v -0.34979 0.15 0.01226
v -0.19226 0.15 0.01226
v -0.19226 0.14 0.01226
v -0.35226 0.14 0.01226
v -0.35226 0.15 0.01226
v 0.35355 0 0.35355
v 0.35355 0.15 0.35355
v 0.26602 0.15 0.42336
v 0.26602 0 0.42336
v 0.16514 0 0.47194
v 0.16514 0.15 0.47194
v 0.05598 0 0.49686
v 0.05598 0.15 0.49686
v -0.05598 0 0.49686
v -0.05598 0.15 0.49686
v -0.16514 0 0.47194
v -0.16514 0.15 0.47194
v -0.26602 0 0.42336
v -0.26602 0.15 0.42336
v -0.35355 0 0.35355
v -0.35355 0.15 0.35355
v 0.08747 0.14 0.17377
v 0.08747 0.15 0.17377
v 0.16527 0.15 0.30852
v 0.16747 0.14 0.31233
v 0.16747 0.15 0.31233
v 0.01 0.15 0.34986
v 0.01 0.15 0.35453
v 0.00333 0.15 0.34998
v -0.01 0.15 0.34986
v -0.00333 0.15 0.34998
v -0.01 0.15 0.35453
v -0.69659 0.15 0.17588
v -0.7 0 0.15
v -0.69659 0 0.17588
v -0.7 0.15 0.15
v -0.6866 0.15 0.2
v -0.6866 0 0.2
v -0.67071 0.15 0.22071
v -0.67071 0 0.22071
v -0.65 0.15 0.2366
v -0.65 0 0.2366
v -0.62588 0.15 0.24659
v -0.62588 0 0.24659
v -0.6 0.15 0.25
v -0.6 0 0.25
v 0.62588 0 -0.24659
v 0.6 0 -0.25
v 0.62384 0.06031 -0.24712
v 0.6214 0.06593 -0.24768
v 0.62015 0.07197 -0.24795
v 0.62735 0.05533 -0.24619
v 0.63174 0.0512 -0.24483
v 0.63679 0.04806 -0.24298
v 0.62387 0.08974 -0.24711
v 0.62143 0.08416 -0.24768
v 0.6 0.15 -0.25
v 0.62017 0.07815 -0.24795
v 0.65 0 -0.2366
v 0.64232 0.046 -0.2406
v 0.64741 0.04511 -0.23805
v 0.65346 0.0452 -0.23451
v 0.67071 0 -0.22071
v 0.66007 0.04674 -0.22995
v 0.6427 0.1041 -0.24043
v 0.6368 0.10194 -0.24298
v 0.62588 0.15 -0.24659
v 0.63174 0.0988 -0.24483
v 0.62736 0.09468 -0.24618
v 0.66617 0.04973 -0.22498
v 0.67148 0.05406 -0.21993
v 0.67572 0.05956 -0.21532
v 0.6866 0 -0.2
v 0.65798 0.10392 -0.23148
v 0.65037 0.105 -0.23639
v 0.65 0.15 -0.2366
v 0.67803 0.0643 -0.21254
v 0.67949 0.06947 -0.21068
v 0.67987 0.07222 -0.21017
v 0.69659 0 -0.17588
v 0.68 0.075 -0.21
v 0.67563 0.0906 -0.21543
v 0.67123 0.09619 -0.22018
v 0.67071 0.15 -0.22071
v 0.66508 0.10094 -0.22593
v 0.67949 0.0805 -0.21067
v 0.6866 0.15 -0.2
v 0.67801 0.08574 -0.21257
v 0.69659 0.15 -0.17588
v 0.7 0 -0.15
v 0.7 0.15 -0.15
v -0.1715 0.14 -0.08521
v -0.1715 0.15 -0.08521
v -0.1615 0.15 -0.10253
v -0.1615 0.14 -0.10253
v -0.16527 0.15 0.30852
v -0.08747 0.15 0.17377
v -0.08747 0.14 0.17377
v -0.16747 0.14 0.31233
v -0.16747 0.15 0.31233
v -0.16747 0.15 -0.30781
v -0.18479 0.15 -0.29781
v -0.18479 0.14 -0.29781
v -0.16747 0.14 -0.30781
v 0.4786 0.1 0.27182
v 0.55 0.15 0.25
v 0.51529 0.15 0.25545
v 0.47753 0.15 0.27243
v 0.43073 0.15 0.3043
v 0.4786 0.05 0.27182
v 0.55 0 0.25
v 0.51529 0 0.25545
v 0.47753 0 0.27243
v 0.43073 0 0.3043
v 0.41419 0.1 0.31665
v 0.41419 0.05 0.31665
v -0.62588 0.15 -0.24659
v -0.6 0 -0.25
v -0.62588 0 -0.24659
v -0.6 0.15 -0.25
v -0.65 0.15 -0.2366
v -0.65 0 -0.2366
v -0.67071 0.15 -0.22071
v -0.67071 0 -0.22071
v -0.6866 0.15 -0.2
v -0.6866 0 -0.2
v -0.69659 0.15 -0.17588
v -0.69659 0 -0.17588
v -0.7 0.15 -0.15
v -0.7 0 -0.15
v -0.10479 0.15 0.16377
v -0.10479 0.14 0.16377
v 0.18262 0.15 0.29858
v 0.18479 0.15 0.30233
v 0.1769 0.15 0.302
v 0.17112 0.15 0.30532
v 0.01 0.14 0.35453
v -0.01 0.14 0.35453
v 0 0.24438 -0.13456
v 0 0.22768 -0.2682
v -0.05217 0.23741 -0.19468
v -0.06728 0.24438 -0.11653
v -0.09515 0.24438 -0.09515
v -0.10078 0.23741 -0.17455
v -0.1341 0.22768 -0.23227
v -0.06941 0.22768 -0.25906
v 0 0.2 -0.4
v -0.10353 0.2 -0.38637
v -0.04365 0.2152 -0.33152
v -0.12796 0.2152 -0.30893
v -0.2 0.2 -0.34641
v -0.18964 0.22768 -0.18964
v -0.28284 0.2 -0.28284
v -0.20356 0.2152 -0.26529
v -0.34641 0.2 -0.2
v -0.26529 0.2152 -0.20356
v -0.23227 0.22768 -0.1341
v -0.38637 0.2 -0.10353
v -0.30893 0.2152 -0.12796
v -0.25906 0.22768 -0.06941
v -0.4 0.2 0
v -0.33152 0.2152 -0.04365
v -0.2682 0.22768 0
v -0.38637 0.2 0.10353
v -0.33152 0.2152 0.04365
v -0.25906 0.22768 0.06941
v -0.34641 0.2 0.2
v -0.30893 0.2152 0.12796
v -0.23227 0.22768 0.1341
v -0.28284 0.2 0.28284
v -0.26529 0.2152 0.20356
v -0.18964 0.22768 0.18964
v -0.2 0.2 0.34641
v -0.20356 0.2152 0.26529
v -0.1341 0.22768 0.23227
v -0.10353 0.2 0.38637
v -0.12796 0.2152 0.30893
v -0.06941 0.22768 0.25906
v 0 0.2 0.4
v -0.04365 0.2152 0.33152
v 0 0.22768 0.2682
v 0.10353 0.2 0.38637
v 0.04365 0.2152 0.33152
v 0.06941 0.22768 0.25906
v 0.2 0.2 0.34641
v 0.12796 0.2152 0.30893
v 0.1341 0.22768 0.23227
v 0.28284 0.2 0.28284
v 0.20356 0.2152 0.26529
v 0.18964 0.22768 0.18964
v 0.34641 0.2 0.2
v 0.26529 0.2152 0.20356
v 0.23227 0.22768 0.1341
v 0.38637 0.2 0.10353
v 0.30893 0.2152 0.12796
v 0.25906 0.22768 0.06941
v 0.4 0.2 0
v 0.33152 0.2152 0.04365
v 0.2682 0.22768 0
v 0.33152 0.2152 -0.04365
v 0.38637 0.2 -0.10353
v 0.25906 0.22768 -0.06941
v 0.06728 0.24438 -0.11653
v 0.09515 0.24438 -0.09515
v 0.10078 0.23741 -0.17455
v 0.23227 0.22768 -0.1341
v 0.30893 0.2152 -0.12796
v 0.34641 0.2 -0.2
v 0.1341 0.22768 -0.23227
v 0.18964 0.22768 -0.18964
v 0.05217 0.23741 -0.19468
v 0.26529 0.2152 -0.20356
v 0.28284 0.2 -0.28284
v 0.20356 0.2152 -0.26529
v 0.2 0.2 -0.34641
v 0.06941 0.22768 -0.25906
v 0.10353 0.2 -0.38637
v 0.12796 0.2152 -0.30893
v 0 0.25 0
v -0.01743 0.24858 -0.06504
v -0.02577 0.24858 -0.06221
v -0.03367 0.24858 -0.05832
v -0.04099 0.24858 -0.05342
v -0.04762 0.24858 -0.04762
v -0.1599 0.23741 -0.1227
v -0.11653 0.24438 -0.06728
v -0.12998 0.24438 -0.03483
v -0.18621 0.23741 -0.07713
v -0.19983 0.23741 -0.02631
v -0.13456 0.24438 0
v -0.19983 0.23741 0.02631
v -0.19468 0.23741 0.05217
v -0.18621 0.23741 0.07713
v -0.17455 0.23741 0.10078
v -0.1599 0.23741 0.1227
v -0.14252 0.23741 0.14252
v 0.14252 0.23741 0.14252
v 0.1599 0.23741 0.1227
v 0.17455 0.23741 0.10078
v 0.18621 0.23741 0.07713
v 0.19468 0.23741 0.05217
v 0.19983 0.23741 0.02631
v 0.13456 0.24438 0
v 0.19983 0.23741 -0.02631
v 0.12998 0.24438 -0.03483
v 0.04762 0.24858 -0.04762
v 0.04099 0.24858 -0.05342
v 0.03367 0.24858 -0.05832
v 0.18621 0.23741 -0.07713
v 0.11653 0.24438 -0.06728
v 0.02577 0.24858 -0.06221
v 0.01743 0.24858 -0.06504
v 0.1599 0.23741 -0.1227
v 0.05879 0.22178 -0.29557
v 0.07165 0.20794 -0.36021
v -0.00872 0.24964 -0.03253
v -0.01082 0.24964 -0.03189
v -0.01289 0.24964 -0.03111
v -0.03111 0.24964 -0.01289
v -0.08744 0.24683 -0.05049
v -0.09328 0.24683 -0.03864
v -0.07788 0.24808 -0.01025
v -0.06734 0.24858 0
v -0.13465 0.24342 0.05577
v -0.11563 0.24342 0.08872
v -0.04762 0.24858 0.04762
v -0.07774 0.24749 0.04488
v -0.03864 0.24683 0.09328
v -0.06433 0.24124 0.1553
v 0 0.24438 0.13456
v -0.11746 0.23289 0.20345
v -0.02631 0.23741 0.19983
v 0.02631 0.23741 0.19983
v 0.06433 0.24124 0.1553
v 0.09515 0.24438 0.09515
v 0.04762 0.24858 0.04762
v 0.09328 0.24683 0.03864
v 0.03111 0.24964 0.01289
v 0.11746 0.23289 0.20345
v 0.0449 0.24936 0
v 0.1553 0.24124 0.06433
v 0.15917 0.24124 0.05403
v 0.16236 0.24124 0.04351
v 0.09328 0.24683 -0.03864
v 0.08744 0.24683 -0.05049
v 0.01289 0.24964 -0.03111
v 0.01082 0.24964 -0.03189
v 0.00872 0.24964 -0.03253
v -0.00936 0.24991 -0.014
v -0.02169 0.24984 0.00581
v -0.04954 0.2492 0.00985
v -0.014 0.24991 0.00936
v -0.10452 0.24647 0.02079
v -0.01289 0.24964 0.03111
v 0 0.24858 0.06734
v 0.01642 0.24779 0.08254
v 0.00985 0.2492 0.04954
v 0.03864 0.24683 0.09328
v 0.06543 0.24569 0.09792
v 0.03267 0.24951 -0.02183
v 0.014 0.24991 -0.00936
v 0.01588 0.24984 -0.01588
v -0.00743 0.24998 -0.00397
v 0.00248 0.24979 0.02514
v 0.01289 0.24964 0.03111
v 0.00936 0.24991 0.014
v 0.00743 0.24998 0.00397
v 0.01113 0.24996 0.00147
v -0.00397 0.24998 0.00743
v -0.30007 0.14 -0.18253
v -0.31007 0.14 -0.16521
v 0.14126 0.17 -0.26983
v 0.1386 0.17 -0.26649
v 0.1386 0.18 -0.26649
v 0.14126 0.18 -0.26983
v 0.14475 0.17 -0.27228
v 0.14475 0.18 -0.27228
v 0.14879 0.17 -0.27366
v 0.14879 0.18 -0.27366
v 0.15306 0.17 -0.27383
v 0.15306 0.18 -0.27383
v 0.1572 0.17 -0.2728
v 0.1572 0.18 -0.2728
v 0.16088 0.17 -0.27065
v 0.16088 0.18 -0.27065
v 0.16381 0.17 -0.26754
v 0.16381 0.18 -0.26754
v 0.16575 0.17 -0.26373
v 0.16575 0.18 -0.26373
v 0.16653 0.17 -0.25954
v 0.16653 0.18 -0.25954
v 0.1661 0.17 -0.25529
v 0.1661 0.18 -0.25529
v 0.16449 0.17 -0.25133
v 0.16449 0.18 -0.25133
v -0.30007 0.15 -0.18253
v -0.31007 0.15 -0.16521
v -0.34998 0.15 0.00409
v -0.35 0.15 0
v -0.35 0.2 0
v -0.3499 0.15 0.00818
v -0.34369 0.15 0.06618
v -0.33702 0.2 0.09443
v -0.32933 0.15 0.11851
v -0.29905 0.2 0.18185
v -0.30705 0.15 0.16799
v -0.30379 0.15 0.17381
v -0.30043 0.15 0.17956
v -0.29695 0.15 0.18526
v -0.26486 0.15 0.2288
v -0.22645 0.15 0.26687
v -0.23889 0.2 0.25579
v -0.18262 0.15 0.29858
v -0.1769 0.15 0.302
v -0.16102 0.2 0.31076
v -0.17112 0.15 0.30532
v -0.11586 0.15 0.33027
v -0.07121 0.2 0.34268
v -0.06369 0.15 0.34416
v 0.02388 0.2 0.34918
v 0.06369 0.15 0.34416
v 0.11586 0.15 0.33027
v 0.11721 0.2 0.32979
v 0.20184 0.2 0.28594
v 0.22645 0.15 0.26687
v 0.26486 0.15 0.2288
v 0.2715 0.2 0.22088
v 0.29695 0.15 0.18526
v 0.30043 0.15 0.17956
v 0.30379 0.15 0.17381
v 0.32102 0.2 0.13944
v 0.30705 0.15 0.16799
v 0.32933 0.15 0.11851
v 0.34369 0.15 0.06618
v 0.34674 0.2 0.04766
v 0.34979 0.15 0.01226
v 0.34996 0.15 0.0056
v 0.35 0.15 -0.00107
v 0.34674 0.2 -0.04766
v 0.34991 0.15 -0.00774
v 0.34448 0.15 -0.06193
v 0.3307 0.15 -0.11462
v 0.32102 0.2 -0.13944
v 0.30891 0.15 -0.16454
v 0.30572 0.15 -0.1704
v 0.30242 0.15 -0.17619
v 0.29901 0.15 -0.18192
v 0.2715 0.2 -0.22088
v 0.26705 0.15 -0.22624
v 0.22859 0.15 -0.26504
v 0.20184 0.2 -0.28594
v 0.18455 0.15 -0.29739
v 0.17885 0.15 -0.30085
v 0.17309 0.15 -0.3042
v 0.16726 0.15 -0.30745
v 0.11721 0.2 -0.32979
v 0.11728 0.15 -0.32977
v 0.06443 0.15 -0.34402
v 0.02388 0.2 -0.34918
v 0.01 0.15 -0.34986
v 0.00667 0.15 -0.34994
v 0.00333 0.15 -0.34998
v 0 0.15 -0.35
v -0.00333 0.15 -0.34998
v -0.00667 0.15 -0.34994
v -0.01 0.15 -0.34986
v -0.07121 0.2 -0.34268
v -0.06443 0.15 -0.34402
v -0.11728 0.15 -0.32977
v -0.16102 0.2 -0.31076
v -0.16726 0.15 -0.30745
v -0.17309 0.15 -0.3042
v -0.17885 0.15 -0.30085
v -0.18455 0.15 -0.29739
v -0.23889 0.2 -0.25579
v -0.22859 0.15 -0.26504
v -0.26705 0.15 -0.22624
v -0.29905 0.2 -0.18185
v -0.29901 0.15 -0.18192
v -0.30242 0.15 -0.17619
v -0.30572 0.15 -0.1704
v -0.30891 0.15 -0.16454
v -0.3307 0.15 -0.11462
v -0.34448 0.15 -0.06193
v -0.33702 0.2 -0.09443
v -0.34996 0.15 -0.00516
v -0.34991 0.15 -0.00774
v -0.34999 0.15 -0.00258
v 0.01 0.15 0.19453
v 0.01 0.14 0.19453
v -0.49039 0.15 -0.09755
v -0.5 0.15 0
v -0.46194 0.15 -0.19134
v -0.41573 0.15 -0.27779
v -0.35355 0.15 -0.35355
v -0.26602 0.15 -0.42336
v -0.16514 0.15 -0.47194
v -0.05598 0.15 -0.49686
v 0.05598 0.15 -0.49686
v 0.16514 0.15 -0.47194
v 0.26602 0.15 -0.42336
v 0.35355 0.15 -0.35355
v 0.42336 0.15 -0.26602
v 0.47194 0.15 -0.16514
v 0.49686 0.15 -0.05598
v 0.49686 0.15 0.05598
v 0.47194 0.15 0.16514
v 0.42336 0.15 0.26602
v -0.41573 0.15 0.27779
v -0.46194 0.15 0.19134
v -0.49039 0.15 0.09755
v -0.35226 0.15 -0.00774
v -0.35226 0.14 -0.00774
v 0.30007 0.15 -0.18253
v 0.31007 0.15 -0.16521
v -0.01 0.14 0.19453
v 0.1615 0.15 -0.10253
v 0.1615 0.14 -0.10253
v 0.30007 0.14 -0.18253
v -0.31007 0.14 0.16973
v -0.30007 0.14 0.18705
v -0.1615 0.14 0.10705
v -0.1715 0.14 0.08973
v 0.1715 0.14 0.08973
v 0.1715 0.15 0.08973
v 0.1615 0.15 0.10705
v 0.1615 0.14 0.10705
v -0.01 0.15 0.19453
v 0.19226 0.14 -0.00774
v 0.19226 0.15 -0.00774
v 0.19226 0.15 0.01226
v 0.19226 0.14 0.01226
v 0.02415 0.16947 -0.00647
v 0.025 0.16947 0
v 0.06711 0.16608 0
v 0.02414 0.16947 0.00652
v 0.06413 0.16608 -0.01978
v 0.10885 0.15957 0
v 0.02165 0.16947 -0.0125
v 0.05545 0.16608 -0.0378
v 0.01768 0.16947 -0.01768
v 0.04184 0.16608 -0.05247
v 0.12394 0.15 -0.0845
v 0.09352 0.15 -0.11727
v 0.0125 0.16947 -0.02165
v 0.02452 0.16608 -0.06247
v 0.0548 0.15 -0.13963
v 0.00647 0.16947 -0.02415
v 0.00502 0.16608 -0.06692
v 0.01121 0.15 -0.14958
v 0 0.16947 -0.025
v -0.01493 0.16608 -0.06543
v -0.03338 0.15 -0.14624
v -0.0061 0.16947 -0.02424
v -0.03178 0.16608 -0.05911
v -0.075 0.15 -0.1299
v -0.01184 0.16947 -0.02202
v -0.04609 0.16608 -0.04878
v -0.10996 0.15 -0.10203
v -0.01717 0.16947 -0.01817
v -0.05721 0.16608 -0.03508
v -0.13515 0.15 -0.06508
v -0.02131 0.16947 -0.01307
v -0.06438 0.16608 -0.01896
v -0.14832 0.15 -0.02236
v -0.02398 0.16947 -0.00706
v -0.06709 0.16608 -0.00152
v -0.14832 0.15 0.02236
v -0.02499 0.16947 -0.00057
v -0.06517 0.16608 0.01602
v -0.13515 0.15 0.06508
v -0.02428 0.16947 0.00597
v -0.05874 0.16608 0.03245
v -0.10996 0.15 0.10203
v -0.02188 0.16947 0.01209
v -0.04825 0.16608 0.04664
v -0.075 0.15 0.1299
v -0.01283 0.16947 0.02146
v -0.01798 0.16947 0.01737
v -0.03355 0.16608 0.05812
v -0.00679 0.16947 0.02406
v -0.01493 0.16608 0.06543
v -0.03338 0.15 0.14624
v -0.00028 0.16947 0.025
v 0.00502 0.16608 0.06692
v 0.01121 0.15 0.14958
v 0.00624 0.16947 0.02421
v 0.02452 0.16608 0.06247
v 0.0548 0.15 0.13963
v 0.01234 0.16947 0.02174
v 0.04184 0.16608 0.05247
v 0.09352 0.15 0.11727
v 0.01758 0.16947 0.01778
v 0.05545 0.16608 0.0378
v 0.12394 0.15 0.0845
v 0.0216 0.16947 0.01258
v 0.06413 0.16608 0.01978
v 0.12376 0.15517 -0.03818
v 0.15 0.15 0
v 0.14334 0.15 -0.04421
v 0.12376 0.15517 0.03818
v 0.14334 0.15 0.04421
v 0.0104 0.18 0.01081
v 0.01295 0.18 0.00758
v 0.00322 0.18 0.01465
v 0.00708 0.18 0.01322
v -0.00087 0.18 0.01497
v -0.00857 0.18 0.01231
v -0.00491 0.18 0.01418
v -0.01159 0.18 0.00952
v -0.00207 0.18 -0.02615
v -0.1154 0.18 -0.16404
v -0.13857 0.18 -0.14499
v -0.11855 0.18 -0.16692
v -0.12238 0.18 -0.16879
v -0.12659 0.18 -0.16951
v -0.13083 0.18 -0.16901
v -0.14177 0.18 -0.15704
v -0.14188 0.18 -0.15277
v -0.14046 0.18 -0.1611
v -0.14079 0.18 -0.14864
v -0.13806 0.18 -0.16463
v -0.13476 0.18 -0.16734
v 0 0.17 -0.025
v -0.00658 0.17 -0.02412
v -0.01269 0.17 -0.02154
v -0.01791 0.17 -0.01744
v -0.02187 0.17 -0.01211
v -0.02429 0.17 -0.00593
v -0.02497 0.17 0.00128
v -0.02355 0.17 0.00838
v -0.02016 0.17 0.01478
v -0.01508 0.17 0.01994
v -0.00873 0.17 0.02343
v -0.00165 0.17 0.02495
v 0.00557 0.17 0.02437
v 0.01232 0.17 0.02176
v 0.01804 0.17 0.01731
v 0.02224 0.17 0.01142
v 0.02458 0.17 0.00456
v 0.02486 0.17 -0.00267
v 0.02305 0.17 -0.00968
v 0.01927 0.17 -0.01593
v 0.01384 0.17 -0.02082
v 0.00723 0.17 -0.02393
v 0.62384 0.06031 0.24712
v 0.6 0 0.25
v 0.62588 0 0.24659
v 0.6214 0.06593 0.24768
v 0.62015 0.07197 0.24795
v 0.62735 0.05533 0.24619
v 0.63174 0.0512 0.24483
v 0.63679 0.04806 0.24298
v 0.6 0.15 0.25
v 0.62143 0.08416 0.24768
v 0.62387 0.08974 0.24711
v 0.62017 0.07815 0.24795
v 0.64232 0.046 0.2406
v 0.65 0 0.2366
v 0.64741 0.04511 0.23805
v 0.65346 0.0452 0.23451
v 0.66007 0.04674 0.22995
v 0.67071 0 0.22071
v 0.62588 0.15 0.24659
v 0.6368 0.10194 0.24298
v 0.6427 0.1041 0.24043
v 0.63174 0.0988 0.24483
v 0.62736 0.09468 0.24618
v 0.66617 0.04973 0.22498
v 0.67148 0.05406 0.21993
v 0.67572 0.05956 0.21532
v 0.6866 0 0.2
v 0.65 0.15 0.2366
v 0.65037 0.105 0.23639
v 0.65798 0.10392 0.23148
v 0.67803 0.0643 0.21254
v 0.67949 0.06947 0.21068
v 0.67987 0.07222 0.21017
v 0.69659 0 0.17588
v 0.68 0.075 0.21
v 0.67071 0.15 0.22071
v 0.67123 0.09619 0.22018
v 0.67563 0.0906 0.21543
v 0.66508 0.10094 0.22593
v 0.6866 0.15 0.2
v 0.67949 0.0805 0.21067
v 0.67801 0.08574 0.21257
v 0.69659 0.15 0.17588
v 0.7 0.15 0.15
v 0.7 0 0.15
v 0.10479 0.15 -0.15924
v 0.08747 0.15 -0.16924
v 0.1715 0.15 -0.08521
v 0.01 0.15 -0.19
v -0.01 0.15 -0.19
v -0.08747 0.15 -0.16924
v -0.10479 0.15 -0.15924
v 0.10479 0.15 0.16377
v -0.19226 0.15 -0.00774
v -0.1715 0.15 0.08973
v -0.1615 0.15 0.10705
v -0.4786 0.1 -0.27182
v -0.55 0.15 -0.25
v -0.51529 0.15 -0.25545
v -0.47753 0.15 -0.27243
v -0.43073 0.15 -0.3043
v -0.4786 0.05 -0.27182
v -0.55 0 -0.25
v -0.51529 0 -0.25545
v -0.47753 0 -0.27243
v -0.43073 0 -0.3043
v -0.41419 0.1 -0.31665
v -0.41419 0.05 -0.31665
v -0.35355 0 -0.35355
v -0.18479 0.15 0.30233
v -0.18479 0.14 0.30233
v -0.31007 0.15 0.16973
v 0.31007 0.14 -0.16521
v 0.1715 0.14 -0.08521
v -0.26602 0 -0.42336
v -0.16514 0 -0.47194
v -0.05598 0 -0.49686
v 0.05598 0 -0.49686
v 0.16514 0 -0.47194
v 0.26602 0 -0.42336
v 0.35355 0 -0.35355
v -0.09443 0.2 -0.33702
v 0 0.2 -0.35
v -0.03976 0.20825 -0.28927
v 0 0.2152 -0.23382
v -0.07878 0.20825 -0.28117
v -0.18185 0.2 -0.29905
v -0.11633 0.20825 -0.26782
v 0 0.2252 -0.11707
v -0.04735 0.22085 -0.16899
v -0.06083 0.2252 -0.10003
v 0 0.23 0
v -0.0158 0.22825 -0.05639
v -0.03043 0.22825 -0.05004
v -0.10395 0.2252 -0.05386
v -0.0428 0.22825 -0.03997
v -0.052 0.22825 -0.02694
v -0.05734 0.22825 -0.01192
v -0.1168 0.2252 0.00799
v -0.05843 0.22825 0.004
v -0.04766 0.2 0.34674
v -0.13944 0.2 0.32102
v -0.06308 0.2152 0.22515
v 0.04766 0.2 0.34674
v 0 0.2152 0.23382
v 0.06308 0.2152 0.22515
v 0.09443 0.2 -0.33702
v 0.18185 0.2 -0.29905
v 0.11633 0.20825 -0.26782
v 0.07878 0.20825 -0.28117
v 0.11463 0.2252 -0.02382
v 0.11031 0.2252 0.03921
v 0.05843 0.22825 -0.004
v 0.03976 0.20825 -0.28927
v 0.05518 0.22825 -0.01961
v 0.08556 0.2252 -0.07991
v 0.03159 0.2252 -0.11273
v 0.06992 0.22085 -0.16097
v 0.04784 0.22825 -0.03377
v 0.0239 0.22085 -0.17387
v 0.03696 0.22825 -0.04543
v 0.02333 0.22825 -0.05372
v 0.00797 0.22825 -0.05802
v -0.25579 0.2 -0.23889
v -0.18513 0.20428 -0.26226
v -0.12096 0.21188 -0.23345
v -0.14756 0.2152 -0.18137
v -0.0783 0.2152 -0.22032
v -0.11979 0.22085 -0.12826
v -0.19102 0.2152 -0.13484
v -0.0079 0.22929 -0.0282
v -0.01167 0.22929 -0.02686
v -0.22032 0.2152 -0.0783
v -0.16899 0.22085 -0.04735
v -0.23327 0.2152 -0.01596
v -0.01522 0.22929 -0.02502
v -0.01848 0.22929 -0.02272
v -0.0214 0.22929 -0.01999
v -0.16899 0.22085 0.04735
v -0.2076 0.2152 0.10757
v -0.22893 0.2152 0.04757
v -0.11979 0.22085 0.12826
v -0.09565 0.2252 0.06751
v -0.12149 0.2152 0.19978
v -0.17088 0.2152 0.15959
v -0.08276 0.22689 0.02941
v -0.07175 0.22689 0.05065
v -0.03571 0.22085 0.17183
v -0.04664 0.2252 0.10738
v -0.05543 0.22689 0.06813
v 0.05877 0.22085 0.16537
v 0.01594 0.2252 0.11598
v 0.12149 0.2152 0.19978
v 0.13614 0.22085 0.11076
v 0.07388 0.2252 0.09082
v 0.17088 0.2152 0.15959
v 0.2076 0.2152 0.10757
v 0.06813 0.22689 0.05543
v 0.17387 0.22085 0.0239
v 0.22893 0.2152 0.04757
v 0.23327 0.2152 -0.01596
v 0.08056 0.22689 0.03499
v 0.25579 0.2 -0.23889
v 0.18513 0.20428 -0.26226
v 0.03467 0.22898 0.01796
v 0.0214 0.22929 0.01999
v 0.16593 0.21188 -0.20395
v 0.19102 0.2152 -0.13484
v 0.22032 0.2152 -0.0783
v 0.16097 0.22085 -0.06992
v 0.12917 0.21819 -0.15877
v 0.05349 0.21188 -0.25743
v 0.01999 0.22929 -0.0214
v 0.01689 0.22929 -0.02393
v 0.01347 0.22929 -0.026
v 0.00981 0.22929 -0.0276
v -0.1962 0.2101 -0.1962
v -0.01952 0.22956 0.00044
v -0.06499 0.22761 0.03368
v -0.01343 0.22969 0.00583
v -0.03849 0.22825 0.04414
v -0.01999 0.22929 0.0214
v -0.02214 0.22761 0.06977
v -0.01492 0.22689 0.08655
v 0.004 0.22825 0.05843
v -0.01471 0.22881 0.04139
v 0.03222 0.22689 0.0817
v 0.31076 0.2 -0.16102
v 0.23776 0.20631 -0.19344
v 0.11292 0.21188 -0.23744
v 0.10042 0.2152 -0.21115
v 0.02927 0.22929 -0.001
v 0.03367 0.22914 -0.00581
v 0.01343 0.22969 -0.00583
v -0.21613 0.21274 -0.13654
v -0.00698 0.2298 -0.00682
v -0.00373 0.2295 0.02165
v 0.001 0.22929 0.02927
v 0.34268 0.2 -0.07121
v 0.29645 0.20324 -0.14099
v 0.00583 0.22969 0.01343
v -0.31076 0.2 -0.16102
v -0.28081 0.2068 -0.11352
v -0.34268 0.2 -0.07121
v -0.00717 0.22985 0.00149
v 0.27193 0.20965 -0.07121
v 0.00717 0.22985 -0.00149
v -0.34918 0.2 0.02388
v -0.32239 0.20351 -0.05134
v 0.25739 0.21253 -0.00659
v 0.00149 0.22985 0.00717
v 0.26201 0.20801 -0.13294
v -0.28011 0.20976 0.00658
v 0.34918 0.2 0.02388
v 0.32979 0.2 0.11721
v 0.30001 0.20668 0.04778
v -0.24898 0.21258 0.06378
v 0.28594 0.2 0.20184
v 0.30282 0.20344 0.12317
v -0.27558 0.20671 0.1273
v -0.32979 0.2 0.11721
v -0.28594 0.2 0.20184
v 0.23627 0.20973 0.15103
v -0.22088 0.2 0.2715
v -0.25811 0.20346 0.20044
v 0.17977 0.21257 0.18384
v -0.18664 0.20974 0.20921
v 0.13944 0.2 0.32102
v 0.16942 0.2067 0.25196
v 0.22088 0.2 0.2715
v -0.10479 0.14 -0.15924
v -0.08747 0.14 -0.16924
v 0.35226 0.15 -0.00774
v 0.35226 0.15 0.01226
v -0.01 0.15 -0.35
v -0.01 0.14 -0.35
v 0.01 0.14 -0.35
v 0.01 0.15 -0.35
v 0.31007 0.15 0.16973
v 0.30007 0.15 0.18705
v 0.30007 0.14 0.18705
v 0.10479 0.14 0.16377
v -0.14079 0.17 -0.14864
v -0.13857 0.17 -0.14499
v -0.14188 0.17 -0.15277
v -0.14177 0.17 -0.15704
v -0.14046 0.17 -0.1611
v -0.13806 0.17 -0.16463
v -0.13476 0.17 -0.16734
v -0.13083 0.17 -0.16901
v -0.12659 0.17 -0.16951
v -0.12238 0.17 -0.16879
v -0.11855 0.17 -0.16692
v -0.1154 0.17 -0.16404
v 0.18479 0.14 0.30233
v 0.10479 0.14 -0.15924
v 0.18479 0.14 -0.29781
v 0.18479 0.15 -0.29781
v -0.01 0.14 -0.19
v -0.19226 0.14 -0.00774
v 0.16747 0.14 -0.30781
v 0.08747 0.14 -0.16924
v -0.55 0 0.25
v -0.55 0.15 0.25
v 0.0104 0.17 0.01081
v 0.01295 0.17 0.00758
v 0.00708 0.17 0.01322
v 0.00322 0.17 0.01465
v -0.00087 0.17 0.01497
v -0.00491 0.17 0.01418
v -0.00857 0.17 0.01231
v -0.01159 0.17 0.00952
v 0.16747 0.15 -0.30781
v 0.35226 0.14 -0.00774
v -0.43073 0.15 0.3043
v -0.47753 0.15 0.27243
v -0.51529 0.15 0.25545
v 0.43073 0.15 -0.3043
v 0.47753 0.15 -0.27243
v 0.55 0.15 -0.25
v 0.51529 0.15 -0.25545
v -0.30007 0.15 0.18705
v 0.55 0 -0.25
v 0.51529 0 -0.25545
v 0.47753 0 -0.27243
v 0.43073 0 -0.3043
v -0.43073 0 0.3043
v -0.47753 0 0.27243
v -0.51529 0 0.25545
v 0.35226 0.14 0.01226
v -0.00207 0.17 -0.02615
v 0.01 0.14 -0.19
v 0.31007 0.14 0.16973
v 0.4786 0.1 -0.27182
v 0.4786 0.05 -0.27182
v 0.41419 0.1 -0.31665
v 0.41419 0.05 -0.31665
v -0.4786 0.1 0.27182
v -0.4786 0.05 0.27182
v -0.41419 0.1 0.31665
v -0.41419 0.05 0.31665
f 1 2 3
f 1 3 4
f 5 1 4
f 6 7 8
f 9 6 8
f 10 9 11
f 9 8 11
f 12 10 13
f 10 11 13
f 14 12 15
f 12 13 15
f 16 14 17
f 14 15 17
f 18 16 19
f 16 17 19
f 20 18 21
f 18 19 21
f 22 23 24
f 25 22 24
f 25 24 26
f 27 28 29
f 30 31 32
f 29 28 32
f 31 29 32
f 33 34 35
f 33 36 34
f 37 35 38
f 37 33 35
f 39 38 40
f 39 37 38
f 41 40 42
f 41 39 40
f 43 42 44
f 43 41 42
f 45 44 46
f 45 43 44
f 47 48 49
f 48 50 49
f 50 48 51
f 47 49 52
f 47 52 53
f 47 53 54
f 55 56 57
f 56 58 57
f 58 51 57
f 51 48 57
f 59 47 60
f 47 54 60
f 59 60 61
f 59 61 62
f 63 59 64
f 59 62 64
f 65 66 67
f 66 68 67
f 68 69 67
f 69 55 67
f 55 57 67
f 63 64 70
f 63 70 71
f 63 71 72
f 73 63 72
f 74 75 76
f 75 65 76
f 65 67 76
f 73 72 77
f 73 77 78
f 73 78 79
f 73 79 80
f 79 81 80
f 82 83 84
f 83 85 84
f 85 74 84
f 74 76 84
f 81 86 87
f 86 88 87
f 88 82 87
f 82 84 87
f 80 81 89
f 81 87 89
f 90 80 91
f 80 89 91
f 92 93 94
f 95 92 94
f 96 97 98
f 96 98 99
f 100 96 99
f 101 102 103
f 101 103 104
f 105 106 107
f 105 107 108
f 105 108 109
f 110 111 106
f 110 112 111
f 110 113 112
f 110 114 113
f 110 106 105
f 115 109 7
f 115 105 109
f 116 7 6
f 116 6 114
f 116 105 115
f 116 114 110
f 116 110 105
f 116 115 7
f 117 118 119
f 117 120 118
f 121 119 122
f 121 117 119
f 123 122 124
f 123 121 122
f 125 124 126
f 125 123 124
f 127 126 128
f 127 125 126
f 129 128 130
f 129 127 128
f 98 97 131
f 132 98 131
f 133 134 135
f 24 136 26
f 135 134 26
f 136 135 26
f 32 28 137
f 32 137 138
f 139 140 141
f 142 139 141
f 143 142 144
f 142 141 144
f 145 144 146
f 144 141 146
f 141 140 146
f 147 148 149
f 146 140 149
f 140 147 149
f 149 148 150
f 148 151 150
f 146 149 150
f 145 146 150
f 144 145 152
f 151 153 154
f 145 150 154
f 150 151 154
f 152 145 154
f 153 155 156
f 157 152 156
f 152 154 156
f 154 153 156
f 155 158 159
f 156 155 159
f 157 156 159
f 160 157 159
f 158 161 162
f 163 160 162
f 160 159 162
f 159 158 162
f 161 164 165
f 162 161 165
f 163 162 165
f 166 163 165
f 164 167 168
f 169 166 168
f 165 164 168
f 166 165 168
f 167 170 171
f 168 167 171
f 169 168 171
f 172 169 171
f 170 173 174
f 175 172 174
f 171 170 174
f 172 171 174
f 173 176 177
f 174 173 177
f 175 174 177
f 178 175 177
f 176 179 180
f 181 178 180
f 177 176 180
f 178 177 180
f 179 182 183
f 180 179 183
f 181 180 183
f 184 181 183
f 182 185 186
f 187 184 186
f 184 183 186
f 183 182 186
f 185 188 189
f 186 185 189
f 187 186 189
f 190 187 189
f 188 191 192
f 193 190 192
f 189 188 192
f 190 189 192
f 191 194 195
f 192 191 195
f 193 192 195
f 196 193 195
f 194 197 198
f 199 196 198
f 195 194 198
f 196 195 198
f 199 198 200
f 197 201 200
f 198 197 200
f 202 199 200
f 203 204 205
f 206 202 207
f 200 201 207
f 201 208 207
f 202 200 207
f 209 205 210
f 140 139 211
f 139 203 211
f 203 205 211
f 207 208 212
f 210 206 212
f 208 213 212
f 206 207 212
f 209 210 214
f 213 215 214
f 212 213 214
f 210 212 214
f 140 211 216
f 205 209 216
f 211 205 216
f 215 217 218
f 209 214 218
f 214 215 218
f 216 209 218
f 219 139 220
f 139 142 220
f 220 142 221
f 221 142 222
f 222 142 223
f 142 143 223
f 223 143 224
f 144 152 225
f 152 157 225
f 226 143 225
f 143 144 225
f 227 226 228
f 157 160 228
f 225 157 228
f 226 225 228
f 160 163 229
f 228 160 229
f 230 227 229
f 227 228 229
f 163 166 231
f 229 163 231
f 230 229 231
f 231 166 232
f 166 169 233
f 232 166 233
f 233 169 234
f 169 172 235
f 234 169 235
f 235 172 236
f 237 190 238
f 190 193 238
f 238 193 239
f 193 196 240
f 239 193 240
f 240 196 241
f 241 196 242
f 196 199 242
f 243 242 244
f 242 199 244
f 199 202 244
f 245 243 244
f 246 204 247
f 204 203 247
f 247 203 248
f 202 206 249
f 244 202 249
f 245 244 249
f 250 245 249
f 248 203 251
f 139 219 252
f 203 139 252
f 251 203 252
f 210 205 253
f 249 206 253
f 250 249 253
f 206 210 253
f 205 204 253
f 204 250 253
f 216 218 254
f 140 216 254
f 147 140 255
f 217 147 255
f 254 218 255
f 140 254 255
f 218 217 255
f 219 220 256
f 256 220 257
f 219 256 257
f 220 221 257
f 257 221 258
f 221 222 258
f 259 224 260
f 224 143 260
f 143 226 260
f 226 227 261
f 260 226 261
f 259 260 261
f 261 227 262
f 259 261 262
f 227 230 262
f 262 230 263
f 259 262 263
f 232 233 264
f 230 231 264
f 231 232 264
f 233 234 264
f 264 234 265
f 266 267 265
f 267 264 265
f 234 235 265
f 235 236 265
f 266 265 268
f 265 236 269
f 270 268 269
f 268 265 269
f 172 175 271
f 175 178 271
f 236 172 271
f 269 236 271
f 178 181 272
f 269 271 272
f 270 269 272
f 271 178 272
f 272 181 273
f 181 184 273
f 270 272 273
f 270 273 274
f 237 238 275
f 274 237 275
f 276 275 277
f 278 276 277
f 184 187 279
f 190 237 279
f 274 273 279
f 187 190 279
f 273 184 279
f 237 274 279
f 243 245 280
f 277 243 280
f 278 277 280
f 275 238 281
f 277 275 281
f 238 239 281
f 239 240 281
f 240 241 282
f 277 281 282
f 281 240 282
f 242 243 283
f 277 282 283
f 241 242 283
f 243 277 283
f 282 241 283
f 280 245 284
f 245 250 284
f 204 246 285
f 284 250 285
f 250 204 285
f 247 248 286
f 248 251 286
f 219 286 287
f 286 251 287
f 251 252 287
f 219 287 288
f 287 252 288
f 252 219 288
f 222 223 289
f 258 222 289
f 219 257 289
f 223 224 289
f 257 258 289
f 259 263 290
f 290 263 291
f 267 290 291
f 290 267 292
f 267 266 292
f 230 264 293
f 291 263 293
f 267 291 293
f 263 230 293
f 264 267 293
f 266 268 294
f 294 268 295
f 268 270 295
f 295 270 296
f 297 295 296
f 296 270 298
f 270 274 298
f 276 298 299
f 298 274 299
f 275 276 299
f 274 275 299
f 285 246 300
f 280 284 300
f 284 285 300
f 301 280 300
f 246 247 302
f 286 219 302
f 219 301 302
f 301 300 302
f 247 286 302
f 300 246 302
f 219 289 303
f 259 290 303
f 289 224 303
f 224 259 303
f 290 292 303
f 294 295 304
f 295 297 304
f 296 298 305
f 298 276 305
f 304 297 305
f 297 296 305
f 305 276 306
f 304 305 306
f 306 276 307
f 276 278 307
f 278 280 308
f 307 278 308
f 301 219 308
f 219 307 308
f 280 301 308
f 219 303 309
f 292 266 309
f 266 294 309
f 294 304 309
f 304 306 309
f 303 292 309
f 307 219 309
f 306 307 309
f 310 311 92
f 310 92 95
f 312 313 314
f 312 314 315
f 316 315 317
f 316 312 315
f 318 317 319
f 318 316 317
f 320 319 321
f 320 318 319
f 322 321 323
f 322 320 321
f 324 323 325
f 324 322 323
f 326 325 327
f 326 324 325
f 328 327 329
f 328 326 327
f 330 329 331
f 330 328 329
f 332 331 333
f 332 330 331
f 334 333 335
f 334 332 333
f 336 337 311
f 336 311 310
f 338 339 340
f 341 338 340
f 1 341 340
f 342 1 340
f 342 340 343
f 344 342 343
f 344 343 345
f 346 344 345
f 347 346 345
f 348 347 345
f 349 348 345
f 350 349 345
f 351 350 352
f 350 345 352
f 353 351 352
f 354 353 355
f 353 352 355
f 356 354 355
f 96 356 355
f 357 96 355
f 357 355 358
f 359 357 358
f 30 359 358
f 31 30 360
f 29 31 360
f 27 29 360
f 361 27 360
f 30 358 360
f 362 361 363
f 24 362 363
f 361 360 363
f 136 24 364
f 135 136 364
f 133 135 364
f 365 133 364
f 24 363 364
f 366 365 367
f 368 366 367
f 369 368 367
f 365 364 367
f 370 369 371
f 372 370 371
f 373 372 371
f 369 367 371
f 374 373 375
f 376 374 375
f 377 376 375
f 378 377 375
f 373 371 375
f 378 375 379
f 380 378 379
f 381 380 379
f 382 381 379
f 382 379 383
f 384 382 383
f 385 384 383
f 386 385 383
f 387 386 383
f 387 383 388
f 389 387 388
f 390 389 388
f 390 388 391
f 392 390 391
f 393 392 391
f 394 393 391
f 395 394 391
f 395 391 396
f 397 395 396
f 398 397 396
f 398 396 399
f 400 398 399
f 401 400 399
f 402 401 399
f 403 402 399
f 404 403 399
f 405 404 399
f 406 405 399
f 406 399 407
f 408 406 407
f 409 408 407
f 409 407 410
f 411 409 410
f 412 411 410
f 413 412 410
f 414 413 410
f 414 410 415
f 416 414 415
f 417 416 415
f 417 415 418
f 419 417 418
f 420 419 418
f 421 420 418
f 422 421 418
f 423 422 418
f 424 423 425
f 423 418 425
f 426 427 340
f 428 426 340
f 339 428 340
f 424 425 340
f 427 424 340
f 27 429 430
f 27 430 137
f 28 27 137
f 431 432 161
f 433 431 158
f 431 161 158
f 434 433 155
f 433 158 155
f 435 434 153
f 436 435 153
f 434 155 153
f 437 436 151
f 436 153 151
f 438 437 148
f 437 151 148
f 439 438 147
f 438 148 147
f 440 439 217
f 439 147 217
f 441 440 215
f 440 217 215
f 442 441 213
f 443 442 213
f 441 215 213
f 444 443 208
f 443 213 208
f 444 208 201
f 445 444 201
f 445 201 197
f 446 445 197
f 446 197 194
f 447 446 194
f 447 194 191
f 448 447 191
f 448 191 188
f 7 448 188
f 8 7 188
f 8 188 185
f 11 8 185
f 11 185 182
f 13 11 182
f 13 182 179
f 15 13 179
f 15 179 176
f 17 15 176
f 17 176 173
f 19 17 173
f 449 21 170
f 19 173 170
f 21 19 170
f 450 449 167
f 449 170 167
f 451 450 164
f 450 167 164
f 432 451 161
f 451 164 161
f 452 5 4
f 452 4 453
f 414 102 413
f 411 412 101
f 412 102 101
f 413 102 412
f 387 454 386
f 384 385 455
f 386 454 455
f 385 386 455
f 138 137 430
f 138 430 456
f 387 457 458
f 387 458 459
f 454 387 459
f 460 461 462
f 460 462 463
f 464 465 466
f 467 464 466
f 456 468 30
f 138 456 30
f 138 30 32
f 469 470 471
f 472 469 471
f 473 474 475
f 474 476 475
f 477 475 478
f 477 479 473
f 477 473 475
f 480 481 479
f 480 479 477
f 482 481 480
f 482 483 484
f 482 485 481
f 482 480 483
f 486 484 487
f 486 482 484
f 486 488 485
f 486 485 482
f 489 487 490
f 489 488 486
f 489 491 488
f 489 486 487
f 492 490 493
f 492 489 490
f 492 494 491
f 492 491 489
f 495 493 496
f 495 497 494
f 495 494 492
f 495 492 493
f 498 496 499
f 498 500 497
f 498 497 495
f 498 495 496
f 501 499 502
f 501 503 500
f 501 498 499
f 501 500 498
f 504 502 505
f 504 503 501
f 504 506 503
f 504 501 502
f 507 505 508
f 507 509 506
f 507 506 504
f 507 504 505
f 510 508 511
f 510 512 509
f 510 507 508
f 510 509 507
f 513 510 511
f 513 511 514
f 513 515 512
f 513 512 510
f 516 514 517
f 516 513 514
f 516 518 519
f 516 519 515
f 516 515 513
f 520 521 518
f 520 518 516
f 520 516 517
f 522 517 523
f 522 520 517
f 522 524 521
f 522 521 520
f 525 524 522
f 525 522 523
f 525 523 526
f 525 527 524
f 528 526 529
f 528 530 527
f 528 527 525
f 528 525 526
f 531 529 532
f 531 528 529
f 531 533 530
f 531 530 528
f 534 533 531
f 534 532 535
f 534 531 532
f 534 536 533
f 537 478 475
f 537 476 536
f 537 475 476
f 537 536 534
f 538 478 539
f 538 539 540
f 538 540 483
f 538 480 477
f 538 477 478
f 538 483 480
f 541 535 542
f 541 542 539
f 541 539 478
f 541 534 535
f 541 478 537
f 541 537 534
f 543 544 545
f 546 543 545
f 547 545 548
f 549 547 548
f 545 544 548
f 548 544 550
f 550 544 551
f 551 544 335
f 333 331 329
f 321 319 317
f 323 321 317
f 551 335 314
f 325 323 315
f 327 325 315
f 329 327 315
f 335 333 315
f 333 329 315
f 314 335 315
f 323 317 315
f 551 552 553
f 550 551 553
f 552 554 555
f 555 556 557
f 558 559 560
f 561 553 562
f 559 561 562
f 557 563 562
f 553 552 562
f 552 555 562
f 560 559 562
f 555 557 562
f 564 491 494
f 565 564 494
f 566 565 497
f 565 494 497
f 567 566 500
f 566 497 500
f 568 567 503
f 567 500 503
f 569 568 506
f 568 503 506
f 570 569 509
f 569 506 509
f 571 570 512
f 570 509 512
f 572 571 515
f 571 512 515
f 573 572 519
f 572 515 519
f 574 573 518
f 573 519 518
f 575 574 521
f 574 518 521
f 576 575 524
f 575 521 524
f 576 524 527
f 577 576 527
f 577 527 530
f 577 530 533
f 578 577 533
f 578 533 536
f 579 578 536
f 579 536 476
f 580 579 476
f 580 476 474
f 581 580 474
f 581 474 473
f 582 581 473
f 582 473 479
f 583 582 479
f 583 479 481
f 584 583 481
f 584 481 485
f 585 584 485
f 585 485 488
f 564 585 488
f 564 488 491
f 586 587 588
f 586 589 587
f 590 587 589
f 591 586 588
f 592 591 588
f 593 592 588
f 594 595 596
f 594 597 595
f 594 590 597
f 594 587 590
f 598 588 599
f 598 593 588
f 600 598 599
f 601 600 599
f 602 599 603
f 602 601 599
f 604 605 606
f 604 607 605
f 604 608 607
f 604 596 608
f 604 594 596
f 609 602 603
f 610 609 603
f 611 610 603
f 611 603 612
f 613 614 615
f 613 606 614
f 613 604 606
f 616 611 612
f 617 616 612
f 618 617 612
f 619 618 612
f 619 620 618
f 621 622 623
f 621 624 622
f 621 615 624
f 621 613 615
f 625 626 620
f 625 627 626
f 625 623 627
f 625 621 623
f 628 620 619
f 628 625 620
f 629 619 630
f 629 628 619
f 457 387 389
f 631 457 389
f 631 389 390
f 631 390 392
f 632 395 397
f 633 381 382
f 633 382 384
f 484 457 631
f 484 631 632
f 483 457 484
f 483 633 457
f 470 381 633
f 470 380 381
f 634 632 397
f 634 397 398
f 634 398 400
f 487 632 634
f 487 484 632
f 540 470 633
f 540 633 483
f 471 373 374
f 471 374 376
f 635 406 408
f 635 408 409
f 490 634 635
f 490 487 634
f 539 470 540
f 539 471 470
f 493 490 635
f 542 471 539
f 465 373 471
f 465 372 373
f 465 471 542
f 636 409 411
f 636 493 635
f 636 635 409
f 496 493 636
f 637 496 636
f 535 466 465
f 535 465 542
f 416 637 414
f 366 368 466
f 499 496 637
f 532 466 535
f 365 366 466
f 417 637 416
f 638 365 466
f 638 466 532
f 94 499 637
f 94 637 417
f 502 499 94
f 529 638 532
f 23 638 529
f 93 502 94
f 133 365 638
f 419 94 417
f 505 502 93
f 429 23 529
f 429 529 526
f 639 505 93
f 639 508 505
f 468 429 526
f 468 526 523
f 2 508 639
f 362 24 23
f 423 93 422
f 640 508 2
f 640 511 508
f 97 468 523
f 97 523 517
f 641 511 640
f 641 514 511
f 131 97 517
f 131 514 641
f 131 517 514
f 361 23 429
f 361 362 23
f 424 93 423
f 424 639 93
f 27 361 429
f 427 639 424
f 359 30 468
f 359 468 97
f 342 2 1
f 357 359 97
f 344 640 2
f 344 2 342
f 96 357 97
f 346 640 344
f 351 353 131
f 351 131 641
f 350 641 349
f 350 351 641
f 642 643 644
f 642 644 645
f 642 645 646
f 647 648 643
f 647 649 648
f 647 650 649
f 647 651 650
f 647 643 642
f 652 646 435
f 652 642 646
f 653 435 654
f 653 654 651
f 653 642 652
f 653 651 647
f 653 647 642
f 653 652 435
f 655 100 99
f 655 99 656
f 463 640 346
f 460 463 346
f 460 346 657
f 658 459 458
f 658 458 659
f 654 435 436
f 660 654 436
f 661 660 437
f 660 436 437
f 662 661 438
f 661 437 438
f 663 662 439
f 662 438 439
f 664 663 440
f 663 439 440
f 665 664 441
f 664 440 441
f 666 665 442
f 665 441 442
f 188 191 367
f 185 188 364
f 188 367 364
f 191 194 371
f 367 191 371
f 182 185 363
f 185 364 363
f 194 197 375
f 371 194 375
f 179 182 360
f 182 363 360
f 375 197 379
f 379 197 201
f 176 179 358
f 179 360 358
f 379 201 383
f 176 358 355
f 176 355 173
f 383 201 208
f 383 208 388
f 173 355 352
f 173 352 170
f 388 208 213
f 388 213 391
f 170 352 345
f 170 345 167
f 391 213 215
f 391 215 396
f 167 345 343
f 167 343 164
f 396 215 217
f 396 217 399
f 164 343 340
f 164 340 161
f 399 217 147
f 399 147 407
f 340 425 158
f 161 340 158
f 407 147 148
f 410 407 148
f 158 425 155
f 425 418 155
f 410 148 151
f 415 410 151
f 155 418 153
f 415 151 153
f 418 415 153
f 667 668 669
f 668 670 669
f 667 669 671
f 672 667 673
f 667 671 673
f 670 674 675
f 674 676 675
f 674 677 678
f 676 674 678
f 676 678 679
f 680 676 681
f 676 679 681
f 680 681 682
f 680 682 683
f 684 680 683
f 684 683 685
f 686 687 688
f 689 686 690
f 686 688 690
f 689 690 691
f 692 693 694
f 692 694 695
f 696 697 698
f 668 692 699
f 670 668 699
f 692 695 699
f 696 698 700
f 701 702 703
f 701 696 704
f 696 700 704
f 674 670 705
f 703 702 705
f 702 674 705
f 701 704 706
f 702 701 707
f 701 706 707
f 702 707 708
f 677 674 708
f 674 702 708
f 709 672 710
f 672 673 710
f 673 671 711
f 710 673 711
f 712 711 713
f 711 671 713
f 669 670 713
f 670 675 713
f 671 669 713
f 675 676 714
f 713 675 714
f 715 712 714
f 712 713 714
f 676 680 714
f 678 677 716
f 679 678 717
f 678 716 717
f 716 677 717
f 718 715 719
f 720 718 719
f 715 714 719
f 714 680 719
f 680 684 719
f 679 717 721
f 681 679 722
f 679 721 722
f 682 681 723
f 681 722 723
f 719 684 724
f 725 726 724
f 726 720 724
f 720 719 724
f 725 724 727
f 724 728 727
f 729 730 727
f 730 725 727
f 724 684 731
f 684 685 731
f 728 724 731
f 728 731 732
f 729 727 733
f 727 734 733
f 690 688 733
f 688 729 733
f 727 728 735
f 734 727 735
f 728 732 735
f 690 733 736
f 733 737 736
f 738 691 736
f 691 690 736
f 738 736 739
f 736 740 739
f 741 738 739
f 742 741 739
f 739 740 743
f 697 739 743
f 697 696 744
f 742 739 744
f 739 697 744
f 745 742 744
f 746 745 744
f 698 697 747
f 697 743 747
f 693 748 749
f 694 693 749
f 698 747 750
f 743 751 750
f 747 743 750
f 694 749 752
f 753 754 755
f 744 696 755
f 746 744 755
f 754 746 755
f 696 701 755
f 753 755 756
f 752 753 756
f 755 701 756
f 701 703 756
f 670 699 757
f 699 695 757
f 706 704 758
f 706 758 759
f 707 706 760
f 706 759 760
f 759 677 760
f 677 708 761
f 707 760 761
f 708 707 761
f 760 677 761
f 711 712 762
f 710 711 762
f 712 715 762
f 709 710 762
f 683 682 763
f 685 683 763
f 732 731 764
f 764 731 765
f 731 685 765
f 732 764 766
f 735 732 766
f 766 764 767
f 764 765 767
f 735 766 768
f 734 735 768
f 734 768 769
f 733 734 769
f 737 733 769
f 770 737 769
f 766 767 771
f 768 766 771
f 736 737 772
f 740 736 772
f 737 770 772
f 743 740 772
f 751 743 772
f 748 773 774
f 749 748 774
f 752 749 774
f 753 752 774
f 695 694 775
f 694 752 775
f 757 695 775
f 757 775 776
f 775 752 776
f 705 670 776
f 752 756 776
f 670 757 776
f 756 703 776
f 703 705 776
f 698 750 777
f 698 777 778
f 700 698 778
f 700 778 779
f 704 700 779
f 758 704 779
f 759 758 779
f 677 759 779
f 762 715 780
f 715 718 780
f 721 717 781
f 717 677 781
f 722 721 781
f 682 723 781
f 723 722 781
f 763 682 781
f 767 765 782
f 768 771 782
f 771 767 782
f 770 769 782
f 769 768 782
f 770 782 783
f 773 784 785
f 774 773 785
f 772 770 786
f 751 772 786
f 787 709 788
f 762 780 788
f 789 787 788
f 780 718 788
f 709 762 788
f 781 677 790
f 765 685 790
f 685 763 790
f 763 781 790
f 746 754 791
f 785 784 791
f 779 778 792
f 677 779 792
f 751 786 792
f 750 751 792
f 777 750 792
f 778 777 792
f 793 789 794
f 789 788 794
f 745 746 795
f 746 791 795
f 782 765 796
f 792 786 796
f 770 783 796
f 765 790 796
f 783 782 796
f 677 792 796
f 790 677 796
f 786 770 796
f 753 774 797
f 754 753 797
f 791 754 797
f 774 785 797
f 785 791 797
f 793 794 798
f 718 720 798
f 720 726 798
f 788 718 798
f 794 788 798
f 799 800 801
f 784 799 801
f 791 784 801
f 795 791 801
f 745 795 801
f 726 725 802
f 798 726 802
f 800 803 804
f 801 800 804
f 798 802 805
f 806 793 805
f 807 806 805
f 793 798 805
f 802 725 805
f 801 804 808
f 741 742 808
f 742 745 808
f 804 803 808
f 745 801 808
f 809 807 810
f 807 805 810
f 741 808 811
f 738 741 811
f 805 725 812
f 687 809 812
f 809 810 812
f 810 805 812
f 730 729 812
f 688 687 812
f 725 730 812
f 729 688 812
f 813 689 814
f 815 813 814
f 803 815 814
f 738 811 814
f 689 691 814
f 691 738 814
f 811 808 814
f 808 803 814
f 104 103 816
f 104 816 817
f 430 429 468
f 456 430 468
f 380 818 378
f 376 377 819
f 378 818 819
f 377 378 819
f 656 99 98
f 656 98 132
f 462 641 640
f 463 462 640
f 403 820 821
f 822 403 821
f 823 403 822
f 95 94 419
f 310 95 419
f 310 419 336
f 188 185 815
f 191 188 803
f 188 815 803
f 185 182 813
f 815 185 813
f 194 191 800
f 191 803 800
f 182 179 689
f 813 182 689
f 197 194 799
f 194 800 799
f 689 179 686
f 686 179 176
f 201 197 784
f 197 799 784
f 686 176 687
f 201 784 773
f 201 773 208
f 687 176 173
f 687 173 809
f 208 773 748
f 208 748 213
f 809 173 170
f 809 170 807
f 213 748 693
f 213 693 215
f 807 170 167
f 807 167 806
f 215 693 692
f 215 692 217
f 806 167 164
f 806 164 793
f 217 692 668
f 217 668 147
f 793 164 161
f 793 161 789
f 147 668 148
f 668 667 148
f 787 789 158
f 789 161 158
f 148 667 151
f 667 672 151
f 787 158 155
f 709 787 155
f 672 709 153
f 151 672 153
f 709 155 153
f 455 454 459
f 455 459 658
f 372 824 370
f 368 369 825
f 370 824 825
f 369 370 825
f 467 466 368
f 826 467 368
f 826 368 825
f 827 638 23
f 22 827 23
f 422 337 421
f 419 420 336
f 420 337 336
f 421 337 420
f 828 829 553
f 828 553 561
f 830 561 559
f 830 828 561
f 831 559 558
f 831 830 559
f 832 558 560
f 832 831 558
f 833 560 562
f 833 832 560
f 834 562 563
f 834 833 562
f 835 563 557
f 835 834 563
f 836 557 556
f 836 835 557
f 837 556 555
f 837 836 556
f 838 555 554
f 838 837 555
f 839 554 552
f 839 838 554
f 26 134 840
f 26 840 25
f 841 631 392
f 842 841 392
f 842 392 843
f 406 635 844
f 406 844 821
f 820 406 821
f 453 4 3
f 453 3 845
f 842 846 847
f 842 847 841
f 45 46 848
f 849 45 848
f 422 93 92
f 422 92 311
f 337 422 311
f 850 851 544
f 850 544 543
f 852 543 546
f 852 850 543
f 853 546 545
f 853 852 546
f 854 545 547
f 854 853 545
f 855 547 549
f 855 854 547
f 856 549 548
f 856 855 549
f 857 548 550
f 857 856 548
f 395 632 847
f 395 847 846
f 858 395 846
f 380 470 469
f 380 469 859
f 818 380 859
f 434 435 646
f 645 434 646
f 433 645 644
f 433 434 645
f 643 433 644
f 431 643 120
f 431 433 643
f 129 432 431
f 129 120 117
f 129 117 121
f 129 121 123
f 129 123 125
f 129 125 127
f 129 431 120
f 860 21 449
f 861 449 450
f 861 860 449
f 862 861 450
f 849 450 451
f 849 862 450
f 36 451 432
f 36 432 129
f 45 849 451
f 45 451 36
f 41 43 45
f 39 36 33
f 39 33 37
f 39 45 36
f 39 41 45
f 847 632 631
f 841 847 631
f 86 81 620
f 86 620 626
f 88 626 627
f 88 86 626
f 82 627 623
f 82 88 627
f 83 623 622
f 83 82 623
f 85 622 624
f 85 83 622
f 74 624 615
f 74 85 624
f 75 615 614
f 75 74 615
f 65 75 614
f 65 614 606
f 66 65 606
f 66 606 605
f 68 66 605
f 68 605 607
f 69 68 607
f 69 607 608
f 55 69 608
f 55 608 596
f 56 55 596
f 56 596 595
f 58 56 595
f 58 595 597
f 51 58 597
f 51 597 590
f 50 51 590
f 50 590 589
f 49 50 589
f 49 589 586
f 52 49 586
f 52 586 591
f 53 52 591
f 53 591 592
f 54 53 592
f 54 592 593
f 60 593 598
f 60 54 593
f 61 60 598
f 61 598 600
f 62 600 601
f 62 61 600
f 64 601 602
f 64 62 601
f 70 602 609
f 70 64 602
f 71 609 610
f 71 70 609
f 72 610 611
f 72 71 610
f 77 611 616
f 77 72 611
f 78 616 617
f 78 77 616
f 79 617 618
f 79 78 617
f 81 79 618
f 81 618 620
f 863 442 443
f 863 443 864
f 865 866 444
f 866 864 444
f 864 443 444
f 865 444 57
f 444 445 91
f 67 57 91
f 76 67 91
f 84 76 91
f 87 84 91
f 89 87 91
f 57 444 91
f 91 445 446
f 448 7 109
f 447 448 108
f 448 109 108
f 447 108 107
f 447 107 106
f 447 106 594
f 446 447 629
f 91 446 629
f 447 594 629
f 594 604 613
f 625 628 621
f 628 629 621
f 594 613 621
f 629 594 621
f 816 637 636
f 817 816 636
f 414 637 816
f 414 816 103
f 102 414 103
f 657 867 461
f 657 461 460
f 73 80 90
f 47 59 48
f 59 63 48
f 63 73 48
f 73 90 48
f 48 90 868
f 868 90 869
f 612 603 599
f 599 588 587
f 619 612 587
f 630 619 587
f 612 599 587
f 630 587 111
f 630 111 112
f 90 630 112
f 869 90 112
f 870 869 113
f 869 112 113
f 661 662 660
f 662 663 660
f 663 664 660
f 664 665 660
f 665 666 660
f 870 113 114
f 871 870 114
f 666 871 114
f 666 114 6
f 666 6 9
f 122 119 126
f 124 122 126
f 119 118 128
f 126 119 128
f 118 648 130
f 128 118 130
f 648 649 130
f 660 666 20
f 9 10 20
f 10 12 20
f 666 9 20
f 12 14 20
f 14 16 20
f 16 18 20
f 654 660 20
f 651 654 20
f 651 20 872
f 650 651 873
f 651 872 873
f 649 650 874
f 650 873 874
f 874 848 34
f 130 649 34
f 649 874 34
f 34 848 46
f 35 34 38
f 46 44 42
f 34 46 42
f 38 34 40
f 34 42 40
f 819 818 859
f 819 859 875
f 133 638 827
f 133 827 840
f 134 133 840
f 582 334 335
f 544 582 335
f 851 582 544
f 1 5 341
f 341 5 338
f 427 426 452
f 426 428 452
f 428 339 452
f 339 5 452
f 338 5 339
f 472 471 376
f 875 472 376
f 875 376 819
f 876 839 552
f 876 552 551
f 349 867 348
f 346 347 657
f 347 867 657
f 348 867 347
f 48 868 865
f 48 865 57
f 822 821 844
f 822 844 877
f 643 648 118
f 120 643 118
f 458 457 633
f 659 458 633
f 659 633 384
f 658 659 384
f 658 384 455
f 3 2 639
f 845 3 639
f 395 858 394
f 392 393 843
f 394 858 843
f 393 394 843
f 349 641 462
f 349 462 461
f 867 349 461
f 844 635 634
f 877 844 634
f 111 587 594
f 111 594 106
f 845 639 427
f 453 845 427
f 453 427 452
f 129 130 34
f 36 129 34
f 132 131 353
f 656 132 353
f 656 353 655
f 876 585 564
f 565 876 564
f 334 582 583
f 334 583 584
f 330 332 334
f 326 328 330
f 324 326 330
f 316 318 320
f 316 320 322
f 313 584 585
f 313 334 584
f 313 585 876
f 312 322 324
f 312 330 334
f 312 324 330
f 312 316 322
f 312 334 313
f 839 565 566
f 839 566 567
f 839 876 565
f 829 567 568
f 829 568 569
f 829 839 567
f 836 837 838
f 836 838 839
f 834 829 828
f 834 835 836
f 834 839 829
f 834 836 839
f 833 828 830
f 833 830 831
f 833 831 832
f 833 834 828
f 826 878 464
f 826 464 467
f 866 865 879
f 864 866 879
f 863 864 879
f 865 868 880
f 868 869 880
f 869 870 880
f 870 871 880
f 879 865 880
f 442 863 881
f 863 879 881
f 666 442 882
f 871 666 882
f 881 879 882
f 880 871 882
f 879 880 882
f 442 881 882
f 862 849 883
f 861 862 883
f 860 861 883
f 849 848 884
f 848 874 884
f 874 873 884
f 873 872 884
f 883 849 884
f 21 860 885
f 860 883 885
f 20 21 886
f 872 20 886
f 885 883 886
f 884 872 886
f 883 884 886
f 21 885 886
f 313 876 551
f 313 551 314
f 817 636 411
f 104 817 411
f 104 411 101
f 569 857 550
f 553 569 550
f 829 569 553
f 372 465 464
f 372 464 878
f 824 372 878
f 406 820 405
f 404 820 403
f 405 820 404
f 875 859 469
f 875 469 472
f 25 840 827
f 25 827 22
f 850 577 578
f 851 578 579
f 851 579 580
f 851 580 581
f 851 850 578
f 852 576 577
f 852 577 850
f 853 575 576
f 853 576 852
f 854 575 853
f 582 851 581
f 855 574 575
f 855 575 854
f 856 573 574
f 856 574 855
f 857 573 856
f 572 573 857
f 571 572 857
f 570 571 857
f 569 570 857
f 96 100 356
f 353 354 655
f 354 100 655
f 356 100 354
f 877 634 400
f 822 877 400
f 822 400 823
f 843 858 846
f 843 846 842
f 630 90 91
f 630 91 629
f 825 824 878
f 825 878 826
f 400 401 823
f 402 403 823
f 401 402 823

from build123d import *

# Parameters (mm, degrees)
SKETCH2_R               = 0.35
CUT_EXTRUDE2_DEPTH      = 0.05
SKETCH3_W               = 0.02
SKETCH3_H               = 0.16
CUT_EXTRUDE3_DEPTH      = 0.01
CIRPATTERN1_COUNT       = 12
SKETCH6_R               = 0.025
BOSS_EXTRUDE2_DEPTH     = 0.02
BOSS_EXTRUDE3_DEPTH     = 0.01
BOSS_EXTRUDE4_DEPTH     = 0.01
BOSS_EXTRUDE5_DEPTH     = 0.15
FILLET2_R               = 0.1
FILLET2_OF_MIRROR1_R    = 0.1
CUT_EXTRUDE4_DEPTH      = 2.055935765
CUT_EXTRUDE4_DEPTH_BACK = 2.055935765
SKETCH11_R              = 0.03


with BuildPart() as part:
    # Sketch1 → Revolve1 (revolve)
    with BuildSketch(Plane.XY, mode=Mode.PRIVATE) as revolve1_sk:
        Polygon((0, 0), (0.5, 0), (0.5, 0.15), (0.4, 0.2), (0, 0.2), align=None)
    revolve(revolve1_sk.sketch.rotate(Axis((0, 0.2, 0), (0, -1, 0)), 180), axis=Axis((0, 0.2, 0), (0, -1, 0)))

    # Sketch2 → Cut-Extrude2 (cut)
    with BuildSketch(Plane(origin=(0, 0.2, 0), x_dir=(1, 0, 0), z_dir=(0, 1, 0))):
        with Locations(Location((0, 0, 0), (0, 0, 180))):
            Circle(SKETCH2_R)
    extrude(amount=-CUT_EXTRUDE2_DEPTH, mode=Mode.SUBTRACT)

    # Sketch3 → Cut-Extrude3 (cut)
    with BuildSketch(Plane(origin=(0, 0.15, 0), x_dir=(1, 0, 0), z_dir=(0, 1, 0))):
        with Locations((0, 0.27)):
            Rectangle(SKETCH3_W, SKETCH3_H)
    cut_extrude3 = extrude(amount=-CUT_EXTRUDE3_DEPTH, mode=Mode.SUBTRACT)

    # CirPattern1: Cut-Extrude3 ×12 about axis
    cirpattern1_axis = Axis((0, 0, 0.002263004), (0, 1, 0))
    for i in range(1, CIRPATTERN1_COUNT):
        add(cut_extrude3.rotate(cirpattern1_axis, i * 360 / CIRPATTERN1_COUNT), mode=Mode.SUBTRACT)

    # Sketch4 → Revolve2 (revolve)
    with BuildSketch(Plane.XY):
        with BuildLine():
            Line((0, 0.15), (0.15, 0.15))
            ThreePointArc((0.15, 0.15), (0.075666667, 0.165000001), (0, 0.17))
            Line((0, 0.17), (0, 0.15))
        make_face()
    revolve(axis=Axis((0, 0, 0), (0, 1, 0)))

    # Sketch6 → Boss-Extrude2 (add)
    with BuildSketch(Plane(origin=(0, 0.15, 0), x_dir=(1, 0, 0), z_dir=(0, 1, 0))):
        with Locations(Location((0, 0, 0), (0, 0, 90))):
            Circle(SKETCH6_R)
    extrude(amount=BOSS_EXTRUDE2_DEPTH)

    # Sketch7 → Boss-Extrude3 (add)
    with BuildSketch(Plane(origin=(0, 0.17, 0), x_dir=(1, 0, 0), z_dir=(0, 1, 0))):
        with BuildLine():
            Line((-0.012945559, 0.007577104), (0.138596523, 0.266488281))
            ThreePointArc((0.138596523, 0.266488281), (0.159119186, 0.271856735), (0.164487641, 0.251334072))
            Line((0.164487641, 0.251334072), (0.012945559, -0.007577104))
            ThreePointArc((0.012945559, -0.007577104), (-0.007577104, -0.012945559), (-0.012945559, 0.007577104))
        make_face()
    extrude(amount=BOSS_EXTRUDE3_DEPTH)

    # Sketch9 → Boss-Extrude4 (add)
    with BuildSketch(Plane(origin=(0, 0.17, 0), x_dir=(1, 0, 0), z_dir=(0, 1, 0))):
        with BuildLine():
            Line((-0.011588664, -0.009523806), (-0.13857274, 0.14499171))
            ThreePointArc((-0.13857274, 0.14499171), (-0.136507882, 0.166104179), (-0.115395412, 0.164039321))
            Line((-0.115395412, 0.164039321), (0.011588664, 0.009523806))
            ThreePointArc((0.011588664, 0.009523806), (0.009523806, -0.011588664), (-0.011588664, -0.009523806))
        make_face()
    extrude(amount=BOSS_EXTRUDE4_DEPTH)

    # Sketch10 → Boss-Extrude5 (add)
    with BuildSketch(Plane.XZ):
        with BuildLine():
            Line((0.55, -0.25), (0.7, -0.25))
            Line((0.7, -0.25), (0.7, 0.25))
            Line((0.7, 0.25), (0.55, 0.25))
            add(Edge.make_bspline(
                [(0.55, 0.25), (0.474025332, 0.25), (0.413386231, 0.330923034), (0.353553391, 0.353553391)],
                knots=[0, 0, 0, 0, 1, 1, 1, 1], degree=3))
            Line((0.353553391, 0.353553391), (0.353553391, -0.353553391))
            add(Edge.make_bspline(
                [(0.55, -0.25), (0.474025332, -0.25), (0.413386231, -0.330923034), (0.353553391, -0.353553391)],
                knots=[0, 0, 0, 0, 1, 1, 1, 1], degree=3))
        make_face()
    boss_extrude5 = extrude(amount=-BOSS_EXTRUDE5_DEPTH)

    # Fillet2
    fillet2_edges = [part.edges().sort_by_distance(p)[0] for p in [
        (0.7, 0.075, -0.25),
        (0.7, 0.075, 0.25),
    ]]
    fillet(fillet2_edges, radius=FILLET2_R)

    # Mirror1: Boss-Extrude5 across plane
    add(boss_extrude5.mirror(Plane(origin=(0, 0, 0), x_dir=(0, 0, 1), z_dir=(1, 0, 0))))

    # Fillet2 of Mirror1
    fillet2_of_mirror1_edges = [part.edges().sort_by_distance(p)[0] for p in [
        (-0.7, 0.075, -0.25),
        (-0.7, 0.075, 0.25),
    ]]
    fillet(fillet2_of_mirror1_edges, radius=FILLET2_OF_MIRROR1_R)

    # Sketch11 → Cut-Extrude4 (cut, two sides: drawn at the far end of the back side and taken through both)
    with BuildSketch(Plane.XY.offset(0.25).offset(-CUT_EXTRUDE4_DEPTH_BACK)):
        with Locations((0.65, 0.075)):
            Circle(SKETCH11_R)
    extrude(amount=CUT_EXTRUDE4_DEPTH + CUT_EXTRUDE4_DEPTH_BACK, mode=Mode.SUBTRACT)


with BuildPart() as body_2:
    # Sketch8 → Revolve3 (revolve)
    with BuildSketch(Plane.XY, mode=Mode.PRIVATE) as revolve3_sk:
        with BuildLine():
            Line((0, 0.23), (0, 0.25))
            ThreePointArc((0, 0.25), (-0.201551632, 0.237413059), (-0.4, 0.2))
            Line((-0.4, 0.2), (-0.35, 0.2))
            ThreePointArc((-0.35, 0.2), (-0.175501439, 0.220850122), (0, 0.23))
        make_face()
    revolve(revolve3_sk.sketch.rotate(Axis((0, 0.23, 0), (0, 1, 0)), 270), axis=Axis((0, 0.23, 0), (0, 1, 0)))


solid = Compound([part.part, body_2.part])
